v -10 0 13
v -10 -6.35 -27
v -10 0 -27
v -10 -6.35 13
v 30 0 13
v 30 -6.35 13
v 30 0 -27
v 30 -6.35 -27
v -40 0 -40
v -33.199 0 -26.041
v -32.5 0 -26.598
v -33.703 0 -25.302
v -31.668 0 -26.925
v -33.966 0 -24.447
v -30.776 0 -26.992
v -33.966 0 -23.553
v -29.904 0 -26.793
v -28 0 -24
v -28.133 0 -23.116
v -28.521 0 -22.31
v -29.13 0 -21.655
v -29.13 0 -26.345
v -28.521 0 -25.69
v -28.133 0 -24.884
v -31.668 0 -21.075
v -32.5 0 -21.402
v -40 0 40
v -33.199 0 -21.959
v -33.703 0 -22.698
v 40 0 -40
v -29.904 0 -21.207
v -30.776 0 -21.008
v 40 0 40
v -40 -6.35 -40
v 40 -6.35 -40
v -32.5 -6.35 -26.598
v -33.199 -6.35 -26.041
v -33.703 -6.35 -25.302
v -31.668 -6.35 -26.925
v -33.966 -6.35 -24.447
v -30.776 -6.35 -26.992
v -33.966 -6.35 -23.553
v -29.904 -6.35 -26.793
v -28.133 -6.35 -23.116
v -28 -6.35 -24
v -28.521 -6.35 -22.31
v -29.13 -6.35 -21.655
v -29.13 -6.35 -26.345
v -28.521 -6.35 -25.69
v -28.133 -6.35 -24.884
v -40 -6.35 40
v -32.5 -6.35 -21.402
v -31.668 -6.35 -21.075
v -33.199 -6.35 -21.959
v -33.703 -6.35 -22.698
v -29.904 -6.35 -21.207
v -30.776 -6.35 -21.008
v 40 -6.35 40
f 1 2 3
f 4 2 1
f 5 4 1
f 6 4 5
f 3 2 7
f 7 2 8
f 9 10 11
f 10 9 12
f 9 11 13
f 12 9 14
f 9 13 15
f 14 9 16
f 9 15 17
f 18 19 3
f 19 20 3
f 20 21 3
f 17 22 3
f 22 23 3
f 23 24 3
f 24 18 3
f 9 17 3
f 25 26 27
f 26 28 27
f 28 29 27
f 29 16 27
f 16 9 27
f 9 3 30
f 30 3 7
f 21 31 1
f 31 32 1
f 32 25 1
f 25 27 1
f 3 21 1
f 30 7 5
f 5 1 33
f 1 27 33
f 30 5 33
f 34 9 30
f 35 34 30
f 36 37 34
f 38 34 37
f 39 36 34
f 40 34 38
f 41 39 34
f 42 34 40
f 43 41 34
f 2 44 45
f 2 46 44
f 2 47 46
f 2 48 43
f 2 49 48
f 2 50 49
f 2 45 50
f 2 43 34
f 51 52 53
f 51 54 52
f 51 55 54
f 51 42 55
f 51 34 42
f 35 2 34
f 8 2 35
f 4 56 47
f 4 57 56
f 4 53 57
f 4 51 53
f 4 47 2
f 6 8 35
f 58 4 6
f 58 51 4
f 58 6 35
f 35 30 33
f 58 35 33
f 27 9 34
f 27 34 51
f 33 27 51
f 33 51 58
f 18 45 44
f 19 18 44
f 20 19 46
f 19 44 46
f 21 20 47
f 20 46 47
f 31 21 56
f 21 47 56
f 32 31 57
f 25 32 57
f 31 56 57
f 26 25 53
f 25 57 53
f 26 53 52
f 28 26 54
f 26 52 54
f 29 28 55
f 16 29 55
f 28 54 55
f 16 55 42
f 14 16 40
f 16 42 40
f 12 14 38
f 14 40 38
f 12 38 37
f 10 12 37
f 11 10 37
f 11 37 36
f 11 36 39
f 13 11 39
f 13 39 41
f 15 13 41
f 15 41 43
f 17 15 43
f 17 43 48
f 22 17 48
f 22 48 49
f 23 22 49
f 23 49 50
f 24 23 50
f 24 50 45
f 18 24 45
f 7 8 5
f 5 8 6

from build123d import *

# Parameters (mm, degrees)
F0_W     = 80
F0_H     = 80
F1_DEPTH = 6.35
F2_W     = 40
F2_H     = 40
F2_R     = 3
F3_DEPTH = 6.351


with BuildPart() as f1:
    # F0 (on Front) → F1 (new body)
    with BuildSketch(Plane.XZ):
        Rectangle(F0_W, F0_H)
    extrude(amount=F1_DEPTH)

    # F2 (on face) → F3 (cut, through all)
    with BuildSketch(Plane.XZ.offset(6.35)):
        with Locations((10, -7)):
            Rectangle(F2_W, F2_H)
        with Locations((-31, -24)):
            Circle(F2_R)
    extrude(amount=-F3_DEPTH, mode=Mode.SUBTRACT)


solid = f1.part
